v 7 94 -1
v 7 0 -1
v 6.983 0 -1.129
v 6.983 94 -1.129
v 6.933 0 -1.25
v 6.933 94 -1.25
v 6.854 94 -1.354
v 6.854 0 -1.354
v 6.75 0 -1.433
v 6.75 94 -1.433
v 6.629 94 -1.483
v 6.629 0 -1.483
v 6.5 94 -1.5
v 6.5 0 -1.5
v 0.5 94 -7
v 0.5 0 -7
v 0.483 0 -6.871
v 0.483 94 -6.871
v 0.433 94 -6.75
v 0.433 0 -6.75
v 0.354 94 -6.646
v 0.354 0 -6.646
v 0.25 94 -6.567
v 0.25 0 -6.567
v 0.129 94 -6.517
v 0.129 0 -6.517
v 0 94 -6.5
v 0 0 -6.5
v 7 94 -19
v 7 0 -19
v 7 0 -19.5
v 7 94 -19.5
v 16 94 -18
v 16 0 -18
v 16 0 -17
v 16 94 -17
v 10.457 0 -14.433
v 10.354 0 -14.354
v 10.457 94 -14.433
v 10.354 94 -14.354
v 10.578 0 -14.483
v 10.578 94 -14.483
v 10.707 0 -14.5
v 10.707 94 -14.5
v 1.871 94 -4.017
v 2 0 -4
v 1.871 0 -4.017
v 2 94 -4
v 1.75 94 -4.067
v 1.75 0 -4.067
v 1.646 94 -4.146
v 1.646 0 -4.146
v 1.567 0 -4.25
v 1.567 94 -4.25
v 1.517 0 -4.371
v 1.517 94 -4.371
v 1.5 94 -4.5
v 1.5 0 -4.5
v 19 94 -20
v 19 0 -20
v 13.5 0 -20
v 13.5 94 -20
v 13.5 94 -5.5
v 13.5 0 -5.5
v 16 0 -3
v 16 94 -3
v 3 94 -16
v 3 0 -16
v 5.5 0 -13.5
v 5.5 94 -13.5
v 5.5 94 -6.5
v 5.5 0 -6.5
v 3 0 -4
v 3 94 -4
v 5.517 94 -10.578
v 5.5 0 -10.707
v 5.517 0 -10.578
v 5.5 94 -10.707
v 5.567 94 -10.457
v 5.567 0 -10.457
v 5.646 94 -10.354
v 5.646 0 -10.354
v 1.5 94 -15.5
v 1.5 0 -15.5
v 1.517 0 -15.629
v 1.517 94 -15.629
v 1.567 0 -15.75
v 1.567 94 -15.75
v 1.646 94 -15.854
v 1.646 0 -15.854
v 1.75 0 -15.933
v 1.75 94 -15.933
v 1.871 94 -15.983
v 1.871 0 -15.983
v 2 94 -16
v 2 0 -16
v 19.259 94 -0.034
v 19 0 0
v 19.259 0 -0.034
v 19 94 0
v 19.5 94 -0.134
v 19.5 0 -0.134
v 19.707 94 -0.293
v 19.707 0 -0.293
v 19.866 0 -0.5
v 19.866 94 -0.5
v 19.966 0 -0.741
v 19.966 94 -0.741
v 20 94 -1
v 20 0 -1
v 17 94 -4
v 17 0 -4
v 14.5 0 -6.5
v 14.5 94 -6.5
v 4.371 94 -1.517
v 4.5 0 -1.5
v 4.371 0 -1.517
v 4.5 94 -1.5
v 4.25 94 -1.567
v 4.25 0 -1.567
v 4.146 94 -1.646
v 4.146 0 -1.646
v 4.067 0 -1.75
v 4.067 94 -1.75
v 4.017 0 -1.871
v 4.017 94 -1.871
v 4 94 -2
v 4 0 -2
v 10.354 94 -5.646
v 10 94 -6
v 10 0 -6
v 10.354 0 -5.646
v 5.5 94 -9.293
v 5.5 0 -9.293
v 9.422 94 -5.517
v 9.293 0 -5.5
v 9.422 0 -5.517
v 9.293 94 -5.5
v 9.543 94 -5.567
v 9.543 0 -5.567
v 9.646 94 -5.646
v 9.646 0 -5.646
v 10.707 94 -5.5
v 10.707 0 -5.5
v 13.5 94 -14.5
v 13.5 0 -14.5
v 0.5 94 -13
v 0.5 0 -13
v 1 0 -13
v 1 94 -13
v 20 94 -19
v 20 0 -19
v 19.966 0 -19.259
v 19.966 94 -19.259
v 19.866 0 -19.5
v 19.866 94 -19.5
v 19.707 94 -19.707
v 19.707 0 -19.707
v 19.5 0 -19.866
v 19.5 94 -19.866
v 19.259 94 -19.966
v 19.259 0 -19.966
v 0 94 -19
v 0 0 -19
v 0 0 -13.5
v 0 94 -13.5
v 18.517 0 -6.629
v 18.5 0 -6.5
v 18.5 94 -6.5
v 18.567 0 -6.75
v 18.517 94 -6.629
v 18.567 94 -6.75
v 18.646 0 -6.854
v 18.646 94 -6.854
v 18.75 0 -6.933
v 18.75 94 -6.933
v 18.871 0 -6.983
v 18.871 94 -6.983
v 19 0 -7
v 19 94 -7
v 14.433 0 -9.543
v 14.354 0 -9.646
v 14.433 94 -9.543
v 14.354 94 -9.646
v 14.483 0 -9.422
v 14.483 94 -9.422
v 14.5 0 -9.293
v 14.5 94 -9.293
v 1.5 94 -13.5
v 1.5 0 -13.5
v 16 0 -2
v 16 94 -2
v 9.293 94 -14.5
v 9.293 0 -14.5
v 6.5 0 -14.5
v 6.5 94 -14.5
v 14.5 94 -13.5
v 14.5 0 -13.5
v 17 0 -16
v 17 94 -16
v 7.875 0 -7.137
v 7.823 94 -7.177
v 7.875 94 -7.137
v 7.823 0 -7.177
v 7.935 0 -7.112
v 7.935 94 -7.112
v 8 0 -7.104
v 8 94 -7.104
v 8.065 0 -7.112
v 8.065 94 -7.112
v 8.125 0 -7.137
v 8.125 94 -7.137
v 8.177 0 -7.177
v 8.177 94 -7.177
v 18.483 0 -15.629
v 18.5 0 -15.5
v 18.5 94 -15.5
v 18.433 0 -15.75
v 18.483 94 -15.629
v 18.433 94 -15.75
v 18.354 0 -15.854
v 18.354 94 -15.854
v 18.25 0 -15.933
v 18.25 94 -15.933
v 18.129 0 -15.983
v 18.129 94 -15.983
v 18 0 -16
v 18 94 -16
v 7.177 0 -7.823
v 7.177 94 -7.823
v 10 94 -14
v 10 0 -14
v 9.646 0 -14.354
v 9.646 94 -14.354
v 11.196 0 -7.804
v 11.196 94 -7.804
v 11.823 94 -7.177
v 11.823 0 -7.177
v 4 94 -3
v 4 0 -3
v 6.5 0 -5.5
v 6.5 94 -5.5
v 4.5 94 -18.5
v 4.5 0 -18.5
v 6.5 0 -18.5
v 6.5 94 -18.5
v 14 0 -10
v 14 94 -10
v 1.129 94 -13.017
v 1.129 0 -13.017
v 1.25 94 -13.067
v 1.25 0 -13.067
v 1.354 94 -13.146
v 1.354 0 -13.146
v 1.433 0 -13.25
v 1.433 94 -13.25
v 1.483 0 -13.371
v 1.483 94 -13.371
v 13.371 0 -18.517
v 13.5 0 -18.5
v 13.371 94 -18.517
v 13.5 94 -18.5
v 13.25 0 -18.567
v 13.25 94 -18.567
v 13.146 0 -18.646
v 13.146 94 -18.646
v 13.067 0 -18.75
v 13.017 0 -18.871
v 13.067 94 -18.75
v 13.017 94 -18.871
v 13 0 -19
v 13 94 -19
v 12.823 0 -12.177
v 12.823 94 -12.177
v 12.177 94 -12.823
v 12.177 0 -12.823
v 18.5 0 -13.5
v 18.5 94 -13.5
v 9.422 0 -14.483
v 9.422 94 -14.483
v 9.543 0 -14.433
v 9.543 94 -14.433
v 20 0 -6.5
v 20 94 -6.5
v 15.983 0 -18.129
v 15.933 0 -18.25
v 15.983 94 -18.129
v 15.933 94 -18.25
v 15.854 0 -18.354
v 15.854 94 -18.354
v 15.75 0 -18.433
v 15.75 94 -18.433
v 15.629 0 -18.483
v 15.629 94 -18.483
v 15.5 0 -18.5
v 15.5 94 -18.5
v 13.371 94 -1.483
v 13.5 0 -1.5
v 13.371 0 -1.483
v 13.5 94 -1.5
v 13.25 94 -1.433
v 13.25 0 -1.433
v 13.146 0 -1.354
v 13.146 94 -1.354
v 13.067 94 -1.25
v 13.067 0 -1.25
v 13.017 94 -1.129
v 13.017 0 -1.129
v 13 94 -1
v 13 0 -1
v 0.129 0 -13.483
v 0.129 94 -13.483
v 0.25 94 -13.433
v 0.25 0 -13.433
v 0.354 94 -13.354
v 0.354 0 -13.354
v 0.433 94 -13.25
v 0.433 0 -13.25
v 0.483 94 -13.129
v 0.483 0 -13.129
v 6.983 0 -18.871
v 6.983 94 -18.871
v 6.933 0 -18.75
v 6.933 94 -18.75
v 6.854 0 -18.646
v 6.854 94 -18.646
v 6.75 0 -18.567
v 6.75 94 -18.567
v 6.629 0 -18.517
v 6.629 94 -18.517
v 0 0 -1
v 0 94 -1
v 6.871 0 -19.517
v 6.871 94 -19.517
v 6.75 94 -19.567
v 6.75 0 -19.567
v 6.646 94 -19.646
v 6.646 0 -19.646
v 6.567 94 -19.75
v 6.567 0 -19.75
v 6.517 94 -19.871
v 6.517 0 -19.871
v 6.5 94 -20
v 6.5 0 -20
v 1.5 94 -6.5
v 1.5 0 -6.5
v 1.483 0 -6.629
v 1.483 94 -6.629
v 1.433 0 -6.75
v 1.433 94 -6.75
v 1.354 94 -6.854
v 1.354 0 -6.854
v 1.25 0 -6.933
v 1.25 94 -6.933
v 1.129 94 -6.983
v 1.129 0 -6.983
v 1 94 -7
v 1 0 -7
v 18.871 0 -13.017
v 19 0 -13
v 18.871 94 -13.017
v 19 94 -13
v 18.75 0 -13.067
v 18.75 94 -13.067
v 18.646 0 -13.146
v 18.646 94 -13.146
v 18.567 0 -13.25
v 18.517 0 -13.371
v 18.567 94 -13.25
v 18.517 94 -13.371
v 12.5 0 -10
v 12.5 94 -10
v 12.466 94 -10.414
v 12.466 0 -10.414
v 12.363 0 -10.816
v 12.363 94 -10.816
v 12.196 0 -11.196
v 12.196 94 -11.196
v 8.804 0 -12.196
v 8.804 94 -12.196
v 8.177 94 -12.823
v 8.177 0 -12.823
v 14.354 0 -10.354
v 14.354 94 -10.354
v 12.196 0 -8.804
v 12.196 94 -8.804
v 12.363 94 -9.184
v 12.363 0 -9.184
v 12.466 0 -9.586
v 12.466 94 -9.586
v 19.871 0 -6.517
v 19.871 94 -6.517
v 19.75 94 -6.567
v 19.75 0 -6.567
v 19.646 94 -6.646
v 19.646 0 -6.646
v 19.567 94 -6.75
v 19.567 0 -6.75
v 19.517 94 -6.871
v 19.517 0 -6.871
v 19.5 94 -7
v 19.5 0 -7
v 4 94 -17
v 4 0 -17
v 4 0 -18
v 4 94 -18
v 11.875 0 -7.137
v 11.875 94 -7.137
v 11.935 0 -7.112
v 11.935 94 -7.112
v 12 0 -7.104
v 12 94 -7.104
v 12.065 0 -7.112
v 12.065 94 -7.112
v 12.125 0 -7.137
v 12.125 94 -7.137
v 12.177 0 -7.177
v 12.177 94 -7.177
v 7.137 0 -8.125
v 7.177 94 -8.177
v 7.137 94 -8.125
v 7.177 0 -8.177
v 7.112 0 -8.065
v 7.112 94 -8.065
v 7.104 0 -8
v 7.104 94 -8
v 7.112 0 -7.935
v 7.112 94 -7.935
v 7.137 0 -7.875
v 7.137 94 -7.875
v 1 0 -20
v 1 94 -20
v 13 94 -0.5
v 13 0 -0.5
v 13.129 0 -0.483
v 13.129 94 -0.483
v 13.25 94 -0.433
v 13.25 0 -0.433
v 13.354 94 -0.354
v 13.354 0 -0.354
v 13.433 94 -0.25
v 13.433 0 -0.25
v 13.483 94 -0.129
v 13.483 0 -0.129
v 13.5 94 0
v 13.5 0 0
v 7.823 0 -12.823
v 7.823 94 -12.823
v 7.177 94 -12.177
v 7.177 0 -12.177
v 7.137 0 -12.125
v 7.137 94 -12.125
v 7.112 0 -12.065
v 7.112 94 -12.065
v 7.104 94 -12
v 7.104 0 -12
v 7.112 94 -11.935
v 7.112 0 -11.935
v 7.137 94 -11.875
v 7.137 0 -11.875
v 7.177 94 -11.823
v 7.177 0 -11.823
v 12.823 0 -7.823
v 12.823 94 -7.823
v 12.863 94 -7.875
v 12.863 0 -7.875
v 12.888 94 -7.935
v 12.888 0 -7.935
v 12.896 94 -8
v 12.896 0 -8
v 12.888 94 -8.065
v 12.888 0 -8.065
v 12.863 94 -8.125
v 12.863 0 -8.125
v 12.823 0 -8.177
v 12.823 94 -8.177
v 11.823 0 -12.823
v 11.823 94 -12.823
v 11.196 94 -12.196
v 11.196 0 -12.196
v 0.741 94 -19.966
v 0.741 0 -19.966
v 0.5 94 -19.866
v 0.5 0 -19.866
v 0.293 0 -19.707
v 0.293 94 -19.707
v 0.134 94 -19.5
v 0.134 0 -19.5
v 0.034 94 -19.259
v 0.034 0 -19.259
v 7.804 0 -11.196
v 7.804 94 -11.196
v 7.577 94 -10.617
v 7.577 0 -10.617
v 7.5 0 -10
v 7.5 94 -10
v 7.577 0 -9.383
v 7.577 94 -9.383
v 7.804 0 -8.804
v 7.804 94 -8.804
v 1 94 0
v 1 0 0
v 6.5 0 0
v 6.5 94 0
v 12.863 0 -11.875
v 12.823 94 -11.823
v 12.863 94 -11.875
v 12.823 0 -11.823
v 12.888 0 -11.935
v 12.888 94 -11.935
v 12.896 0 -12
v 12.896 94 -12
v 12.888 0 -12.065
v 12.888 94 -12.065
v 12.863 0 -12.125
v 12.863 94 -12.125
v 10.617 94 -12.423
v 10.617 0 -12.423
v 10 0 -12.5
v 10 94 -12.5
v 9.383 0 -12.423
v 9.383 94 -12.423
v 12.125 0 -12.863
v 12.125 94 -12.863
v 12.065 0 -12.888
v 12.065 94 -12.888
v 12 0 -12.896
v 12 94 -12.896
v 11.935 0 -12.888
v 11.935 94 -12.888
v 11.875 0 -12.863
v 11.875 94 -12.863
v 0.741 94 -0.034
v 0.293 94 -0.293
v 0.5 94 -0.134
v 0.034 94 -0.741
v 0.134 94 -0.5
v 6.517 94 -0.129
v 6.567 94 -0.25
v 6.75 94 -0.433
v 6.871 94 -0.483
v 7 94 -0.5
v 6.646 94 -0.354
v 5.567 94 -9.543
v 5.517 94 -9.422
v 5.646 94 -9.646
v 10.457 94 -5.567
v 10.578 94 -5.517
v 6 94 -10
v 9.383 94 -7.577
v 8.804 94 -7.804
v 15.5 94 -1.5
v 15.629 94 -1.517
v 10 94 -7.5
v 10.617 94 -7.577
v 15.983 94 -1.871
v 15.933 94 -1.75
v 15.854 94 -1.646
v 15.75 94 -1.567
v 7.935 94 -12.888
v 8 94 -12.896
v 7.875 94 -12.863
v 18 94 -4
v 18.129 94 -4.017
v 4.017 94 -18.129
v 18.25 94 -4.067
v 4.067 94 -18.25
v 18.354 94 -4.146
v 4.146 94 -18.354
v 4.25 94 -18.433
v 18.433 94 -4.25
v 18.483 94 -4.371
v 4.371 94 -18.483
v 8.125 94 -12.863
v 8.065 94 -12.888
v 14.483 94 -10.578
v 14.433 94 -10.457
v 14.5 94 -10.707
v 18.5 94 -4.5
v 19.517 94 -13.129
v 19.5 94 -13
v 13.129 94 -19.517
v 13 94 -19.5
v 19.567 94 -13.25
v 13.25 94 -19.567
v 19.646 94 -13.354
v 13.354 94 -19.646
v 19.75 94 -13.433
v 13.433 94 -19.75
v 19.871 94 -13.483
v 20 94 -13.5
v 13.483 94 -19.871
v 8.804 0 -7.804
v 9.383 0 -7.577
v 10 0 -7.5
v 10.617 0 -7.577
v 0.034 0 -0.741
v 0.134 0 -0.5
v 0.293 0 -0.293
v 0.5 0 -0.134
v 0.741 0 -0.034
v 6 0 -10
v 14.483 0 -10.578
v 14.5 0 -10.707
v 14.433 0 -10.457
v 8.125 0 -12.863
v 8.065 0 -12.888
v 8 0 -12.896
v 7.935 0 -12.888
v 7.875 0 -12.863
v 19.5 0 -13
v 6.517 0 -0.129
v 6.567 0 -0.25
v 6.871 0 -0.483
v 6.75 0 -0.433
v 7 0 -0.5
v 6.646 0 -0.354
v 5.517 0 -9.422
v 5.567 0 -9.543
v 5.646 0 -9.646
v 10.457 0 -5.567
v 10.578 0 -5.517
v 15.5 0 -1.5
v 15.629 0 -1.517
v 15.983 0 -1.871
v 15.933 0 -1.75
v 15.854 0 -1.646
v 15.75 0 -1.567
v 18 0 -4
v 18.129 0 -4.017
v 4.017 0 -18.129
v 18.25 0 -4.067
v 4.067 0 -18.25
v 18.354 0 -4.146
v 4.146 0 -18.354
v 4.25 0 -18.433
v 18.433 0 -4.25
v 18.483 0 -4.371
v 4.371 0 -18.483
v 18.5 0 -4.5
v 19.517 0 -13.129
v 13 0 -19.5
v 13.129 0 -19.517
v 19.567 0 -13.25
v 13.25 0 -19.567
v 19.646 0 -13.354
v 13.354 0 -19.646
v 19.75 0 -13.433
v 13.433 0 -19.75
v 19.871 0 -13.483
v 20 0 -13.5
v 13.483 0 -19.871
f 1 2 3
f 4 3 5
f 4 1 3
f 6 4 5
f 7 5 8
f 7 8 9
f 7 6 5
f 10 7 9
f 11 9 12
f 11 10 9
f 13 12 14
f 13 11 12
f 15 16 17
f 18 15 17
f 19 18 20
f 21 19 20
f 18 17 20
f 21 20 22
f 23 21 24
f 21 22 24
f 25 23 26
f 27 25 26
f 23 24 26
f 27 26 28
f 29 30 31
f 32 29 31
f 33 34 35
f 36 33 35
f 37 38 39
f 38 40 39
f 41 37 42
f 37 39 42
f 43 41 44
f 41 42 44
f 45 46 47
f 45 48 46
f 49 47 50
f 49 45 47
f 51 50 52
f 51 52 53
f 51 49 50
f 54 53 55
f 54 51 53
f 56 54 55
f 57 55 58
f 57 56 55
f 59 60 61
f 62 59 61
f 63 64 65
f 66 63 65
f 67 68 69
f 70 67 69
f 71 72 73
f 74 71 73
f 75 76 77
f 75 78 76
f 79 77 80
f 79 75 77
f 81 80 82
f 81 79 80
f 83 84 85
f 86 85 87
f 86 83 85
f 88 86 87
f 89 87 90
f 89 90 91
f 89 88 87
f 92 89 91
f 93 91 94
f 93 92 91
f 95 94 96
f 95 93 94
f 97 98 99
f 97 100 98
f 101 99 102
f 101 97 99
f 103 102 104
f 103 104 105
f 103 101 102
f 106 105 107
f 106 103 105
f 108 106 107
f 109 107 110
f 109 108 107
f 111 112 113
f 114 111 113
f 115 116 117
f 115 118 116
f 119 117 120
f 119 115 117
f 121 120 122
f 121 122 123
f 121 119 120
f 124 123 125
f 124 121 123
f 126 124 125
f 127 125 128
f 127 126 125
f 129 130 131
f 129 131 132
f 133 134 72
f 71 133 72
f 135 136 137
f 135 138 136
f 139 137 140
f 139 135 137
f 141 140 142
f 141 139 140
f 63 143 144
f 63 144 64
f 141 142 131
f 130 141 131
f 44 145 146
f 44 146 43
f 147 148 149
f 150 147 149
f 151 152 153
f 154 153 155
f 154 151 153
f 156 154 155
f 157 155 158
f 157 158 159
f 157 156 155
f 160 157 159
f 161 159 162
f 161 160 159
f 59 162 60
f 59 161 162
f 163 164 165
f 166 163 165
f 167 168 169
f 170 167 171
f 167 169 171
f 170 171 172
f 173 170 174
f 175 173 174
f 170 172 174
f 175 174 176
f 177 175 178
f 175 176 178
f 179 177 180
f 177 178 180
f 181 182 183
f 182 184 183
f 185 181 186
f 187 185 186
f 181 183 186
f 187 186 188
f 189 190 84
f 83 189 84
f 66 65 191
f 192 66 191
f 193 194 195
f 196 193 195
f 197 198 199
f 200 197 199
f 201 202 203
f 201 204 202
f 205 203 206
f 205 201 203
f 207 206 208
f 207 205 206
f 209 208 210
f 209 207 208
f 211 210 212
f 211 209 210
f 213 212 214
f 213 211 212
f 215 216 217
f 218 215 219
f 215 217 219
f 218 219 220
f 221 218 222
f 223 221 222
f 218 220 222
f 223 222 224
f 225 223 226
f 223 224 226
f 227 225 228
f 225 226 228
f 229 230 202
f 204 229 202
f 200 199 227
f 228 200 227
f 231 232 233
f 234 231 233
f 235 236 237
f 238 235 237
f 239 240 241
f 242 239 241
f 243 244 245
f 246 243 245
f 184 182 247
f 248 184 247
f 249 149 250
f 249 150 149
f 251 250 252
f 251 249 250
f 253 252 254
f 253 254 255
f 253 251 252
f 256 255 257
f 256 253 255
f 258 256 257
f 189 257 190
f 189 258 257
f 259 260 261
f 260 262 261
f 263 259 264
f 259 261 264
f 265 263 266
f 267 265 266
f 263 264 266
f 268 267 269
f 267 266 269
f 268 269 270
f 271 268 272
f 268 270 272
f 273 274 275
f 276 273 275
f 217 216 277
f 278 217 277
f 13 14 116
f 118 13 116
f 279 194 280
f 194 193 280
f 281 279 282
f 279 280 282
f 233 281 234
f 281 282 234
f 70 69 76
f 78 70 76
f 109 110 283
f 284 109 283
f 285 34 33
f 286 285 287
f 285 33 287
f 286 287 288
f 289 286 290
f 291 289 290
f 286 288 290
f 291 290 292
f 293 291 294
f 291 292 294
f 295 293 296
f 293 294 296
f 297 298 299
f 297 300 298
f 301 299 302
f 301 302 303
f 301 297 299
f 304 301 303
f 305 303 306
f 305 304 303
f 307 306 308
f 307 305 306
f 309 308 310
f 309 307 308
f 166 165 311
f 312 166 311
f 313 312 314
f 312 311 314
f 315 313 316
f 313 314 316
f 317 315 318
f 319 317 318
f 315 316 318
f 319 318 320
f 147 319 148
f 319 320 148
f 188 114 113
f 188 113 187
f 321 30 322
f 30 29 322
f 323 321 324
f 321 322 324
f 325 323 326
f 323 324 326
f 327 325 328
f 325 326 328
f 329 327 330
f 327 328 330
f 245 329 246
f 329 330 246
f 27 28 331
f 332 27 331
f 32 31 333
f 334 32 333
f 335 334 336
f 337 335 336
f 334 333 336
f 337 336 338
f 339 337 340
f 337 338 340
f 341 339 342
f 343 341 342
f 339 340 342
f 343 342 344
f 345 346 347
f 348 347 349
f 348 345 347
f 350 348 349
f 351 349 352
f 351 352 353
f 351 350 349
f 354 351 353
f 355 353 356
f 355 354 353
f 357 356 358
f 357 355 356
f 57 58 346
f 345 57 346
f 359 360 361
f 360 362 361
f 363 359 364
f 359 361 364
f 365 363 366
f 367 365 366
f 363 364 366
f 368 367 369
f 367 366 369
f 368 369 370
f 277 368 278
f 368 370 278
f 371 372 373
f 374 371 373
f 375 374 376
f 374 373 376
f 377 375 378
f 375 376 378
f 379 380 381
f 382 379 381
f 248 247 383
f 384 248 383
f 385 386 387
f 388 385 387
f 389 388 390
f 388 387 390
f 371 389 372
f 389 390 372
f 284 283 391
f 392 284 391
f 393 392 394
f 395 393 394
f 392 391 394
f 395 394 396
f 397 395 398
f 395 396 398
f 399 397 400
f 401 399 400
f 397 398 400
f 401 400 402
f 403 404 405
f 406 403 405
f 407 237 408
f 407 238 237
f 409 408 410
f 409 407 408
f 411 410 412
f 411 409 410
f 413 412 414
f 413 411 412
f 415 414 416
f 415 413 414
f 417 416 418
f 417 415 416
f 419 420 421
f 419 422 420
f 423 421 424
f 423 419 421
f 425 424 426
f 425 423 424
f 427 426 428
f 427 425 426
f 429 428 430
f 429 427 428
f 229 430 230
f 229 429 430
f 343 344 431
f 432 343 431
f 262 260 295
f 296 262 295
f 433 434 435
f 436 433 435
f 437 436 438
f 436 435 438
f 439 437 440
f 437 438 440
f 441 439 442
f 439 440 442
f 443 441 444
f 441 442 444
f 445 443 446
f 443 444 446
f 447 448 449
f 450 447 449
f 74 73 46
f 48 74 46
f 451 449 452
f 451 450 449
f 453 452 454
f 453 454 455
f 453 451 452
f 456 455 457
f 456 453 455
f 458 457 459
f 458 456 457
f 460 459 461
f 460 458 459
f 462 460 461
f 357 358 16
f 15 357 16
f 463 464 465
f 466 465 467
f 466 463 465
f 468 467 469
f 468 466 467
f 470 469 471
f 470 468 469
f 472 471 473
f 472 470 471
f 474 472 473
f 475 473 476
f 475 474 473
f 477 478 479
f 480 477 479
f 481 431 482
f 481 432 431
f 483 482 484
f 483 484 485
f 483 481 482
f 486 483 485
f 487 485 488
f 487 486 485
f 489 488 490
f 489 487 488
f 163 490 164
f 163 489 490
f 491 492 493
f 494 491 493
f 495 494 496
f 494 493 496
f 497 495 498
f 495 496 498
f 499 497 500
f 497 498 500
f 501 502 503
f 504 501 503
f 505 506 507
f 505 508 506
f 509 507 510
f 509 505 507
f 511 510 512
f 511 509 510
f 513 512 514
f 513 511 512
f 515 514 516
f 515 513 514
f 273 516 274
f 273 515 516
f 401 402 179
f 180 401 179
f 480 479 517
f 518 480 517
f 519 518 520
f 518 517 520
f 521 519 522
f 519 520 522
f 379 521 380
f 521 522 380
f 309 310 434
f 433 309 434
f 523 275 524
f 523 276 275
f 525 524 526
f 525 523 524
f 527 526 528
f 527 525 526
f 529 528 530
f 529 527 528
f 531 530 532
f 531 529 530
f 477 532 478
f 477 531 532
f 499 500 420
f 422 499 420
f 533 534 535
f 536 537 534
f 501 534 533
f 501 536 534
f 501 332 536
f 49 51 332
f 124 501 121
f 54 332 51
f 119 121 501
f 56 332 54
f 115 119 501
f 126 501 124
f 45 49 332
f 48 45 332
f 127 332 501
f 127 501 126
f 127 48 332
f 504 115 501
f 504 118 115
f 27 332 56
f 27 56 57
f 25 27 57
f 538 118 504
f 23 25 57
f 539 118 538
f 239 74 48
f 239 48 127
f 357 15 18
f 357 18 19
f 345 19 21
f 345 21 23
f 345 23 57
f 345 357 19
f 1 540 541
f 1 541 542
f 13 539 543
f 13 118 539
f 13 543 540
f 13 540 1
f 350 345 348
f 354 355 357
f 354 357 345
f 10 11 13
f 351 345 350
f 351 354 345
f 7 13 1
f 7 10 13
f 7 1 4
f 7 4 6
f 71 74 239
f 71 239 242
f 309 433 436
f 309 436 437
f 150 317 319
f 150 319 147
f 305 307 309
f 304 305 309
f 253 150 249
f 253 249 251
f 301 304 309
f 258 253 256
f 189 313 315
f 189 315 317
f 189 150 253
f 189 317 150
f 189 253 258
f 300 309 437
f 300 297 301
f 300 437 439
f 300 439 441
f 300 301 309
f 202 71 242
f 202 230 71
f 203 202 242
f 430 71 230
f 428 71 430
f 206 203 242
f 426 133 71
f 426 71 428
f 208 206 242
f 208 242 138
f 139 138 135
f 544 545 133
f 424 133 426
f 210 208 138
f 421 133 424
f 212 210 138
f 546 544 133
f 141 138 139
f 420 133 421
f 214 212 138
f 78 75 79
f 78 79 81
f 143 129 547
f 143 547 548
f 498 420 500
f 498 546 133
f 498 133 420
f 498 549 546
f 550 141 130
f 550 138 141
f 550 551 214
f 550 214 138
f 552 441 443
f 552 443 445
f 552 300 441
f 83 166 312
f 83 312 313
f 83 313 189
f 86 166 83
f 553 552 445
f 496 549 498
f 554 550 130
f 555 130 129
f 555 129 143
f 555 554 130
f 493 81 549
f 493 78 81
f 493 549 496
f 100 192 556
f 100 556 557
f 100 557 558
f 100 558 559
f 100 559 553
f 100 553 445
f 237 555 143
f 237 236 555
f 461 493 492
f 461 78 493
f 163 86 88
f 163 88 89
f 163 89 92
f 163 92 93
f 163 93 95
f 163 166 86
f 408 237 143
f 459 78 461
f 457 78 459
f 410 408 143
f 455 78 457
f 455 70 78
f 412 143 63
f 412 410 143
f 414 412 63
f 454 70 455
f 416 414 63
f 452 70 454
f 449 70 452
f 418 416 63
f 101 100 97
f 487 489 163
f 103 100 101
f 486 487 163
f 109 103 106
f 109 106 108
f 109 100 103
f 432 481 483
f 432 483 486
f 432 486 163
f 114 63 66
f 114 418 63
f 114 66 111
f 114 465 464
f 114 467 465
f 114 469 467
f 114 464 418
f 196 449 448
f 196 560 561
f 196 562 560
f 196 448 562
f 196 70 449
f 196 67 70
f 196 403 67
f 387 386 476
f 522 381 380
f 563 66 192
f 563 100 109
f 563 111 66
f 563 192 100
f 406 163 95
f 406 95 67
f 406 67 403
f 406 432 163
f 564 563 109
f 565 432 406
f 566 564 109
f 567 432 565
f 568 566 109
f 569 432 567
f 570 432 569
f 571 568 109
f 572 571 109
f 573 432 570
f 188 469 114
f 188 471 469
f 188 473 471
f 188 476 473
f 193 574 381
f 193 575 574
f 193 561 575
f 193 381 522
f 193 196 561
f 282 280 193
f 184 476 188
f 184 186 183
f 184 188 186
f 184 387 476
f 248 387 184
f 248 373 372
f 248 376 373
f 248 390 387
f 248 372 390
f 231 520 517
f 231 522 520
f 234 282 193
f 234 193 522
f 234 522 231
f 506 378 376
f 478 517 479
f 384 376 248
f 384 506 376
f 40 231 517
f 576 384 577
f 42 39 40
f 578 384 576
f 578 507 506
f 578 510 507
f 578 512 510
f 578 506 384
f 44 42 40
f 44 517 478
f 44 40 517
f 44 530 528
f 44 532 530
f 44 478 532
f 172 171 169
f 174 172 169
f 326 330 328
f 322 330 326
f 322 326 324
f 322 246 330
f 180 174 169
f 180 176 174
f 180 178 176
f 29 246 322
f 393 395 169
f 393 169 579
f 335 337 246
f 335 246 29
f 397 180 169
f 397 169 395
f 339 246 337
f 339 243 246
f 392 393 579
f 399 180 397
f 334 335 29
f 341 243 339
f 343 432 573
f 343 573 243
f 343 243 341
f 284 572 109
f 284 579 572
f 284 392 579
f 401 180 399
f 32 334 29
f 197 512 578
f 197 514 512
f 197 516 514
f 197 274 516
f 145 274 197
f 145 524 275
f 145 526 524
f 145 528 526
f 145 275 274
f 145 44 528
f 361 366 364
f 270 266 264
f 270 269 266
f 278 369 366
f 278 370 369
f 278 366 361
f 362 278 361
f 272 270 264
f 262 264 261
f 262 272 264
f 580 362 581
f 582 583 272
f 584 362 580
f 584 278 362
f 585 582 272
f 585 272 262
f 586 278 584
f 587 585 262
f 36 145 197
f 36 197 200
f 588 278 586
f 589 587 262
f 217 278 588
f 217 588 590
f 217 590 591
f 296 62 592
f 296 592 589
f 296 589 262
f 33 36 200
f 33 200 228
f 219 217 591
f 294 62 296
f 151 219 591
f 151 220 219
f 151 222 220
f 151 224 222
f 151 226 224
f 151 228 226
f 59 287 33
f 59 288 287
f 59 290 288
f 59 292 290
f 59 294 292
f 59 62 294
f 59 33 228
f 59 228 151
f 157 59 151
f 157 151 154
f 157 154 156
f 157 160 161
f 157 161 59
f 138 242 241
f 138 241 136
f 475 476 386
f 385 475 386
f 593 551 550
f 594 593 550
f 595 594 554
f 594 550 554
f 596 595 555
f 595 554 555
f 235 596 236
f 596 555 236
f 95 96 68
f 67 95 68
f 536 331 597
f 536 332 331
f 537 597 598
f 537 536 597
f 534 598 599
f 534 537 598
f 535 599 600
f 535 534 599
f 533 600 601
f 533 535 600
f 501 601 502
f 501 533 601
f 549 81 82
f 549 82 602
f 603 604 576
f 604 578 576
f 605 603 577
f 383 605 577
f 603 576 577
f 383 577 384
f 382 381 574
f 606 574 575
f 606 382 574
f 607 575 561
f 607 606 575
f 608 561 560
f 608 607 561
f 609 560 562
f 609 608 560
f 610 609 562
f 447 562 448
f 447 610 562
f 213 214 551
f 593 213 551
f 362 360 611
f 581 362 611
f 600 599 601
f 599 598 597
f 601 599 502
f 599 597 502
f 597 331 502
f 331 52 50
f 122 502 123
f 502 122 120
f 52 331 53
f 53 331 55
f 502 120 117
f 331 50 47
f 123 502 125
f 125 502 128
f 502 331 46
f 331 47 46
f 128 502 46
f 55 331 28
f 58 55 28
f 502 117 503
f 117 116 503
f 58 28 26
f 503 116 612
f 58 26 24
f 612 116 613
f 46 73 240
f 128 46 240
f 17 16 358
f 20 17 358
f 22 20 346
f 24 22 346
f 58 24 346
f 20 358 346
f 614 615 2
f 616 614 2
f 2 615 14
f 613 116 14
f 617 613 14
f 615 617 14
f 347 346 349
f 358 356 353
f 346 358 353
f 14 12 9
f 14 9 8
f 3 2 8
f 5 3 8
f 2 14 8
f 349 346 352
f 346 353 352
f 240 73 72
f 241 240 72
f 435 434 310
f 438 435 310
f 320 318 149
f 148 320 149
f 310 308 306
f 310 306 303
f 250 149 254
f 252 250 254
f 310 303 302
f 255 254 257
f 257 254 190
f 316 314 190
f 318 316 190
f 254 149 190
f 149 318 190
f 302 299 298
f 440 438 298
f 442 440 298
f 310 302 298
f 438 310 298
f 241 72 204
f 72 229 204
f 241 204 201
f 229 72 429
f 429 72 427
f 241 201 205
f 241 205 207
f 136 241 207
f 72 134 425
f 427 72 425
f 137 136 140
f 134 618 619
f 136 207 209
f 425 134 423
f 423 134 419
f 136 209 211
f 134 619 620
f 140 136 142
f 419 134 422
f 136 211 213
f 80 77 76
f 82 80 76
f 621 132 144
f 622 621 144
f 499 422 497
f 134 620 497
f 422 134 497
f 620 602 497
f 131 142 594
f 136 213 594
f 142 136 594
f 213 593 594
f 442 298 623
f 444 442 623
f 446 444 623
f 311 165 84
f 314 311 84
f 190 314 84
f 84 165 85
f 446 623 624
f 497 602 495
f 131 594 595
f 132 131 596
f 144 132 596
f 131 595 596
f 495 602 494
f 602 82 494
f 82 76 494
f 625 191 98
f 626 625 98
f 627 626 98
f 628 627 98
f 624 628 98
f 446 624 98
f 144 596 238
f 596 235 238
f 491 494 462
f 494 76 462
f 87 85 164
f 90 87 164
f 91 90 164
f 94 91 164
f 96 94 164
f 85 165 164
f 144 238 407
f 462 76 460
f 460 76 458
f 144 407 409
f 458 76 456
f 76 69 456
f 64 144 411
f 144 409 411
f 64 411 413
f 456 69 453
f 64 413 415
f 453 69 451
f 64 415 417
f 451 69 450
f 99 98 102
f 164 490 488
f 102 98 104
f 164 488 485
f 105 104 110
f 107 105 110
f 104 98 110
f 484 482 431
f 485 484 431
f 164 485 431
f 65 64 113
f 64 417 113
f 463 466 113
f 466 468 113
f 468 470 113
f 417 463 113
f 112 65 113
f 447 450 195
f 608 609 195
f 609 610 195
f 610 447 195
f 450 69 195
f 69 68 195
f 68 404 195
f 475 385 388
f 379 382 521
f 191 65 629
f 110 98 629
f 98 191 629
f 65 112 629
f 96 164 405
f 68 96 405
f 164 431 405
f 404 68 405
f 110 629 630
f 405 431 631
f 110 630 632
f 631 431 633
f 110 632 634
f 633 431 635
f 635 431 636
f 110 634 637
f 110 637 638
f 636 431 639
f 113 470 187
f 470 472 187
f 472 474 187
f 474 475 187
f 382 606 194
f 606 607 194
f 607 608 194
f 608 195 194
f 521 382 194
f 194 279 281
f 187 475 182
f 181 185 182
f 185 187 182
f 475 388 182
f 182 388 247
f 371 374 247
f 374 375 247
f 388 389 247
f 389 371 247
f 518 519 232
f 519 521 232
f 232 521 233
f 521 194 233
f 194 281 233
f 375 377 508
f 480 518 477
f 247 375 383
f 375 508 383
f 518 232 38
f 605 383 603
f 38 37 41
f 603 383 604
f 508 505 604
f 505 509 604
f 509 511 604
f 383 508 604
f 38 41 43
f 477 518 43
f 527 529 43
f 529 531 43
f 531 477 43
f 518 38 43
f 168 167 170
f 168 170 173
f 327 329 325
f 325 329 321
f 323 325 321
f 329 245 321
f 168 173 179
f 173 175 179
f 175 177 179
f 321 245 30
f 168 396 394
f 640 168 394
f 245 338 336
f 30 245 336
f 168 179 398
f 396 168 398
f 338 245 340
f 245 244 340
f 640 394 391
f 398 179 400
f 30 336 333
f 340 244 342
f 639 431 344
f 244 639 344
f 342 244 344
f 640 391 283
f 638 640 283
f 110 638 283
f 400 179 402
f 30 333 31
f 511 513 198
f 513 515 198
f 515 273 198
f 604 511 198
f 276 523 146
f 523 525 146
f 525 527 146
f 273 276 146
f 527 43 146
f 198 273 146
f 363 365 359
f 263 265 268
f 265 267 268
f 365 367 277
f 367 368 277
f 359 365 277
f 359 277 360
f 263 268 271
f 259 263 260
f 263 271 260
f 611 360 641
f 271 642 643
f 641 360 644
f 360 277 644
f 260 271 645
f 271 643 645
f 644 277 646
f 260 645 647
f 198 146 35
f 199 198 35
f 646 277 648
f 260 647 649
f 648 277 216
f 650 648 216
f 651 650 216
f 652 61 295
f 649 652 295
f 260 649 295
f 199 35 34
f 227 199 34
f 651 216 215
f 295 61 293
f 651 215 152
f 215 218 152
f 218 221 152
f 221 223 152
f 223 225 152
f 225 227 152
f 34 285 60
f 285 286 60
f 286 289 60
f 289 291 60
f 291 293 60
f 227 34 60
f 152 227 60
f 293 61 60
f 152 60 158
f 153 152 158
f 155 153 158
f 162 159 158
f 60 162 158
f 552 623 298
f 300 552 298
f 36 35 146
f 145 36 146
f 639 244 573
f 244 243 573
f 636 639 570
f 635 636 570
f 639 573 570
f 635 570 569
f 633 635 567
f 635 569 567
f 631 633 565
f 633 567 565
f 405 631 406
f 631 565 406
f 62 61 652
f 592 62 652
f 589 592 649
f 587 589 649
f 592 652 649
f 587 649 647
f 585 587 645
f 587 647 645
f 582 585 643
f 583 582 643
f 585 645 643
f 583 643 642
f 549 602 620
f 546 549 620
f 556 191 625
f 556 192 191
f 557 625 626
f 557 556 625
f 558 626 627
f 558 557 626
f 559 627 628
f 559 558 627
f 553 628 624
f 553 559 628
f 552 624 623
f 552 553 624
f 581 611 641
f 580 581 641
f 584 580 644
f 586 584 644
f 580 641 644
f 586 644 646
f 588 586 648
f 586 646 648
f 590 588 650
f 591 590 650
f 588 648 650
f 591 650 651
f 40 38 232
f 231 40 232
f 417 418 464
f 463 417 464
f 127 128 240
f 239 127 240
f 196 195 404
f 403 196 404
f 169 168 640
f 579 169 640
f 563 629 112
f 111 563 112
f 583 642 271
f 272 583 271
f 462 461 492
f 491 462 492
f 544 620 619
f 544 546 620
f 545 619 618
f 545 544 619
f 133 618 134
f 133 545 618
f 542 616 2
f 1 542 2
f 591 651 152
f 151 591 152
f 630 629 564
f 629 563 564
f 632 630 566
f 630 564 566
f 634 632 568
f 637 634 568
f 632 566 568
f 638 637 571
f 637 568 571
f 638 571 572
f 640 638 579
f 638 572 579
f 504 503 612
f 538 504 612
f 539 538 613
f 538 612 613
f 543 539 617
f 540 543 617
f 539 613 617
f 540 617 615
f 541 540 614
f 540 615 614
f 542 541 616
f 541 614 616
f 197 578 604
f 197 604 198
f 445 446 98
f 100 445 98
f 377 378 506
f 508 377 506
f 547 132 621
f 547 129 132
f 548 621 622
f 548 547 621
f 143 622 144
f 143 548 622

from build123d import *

# Parameters (mm, degrees)
BOSS_EXTRUDE1_DEPTH = 94
FILLET1_R           = 1
CUT_EXTRUDE1_DEPTH  = 95
FILLET2_R           = 0.5
FILLET3_R           = 0.25


with BuildPart() as part:
    # Sketch3 → Boss-Extrude1 (new body)
    with BuildSketch(Plane(origin=(0, 0, 0), x_dir=(1, 0, 0), z_dir=(0, 1, 0))):
        with BuildLine():
            Line((7, 18.5), (7, 19.5))
            ThreePointArc((7, 19.5), (6.646446609, 19.646446609), (6.5, 20))
            Line((6.5, 20), (0, 20))
            Line((0, 20), (0, 13.5))
            ThreePointArc((0, 13.5), (0.353553391, 13.353553391), (0.5, 13))
            Line((0.5, 13), (1.5, 13))
            Line((1.5, 13), (1.5, 16))
            Line((1.5, 16), (3, 16))
            Line((3, 16), (5.5, 13.5))
            Line((5.5, 13.5), (5.5, 10.5))
            Line((5.5, 10.5), (6, 10))
            Line((6, 10), (5.5, 9.5))
            Line((5.5, 9.5), (5.5, 6.5))
            Line((5.5, 6.5), (3, 4))
            Line((3, 4), (1.5, 4))
            Line((1.5, 4), (1.5, 7))
            Line((1.5, 7), (0.5, 7))
            ThreePointArc((0.5, 7), (0.353553391, 6.646446609), (0, 6.5))
            Line((0, 6.5), (0, 0))
            Line((0, 0), (6.5, 0))
            ThreePointArc((6.5, 0), (6.646446609, 0.353553391), (7, 0.5))
            Line((7, 0.5), (7, 1.5))
            Line((7, 1.5), (4, 1.5))
            Line((4, 1.5), (4, 3))
            Line((4, 3), (6.5, 5.5))
            Line((6.5, 5.5), (9.5, 5.5))
            Line((9.5, 5.5), (10, 6))
            Line((10, 6), (10.5, 5.5))
            Line((10.5, 5.5), (13.5, 5.5))
            Line((13.5, 5.5), (16, 3))
            Line((16, 3), (16, 1.5))
            Line((16, 1.5), (13, 1.5))
            Line((13, 1.5), (13, 0.5))
            ThreePointArc((13, 0.5), (13.353553391, 0.353553391), (13.5, 0))
            Line((13.5, 0), (20, 0))
            Line((20, 0), (20, 6.5))
            ThreePointArc((20, 6.5), (19.646446609, 6.646446609), (19.5, 7))
            Line((19.5, 7), (18.5, 7))
            Line((18.5, 7), (18.5, 4))
            Line((18.5, 4), (17, 4))
            Line((17, 4), (14.5, 6.5))
            Line((14.5, 6.5), (14.5, 9.5))
            Line((14.5, 9.5), (14, 10))
            Line((14, 10), (14.5, 10.5))
            Line((14.5, 10.5), (14.5, 13.5))
            Line((14.5, 13.5), (17, 16))
            Line((17, 16), (18.5, 16))
            Line((18.5, 16), (18.5, 13))
            Line((18.5, 13), (19.5, 13))
            ThreePointArc((19.5, 13), (19.646446609, 13.353553391), (20, 13.5))
            Line((20, 13.5), (20, 20))
            Line((20, 20), (13.5, 20))
            ThreePointArc((13.5, 20), (13.353553391, 19.646446609), (13, 19.5))
            Line((13, 19.5), (13, 18.5))
            Line((13, 18.5), (16, 18.5))
            Line((16, 18.5), (16, 17))
            Line((16, 17), (13.5, 14.5))
            Line((13.5, 14.5), (10.5, 14.5))
            Line((10.5, 14.5), (10, 14))
            Line((10, 14), (9.5, 14.5))
            Line((9.5, 14.5), (6.5, 14.5))
            Line((6.5, 14.5), (4, 17))
            Line((4, 17), (4, 18.5))
            Line((4, 18.5), (7, 18.5))
        make_face()
    extrude(amount=BOSS_EXTRUDE1_DEPTH)

    # Fillet1
    fillet1_edges = [part.edges().sort_by_distance(p)[0] for p in [
        (20, 47, 0),
        (0, 47, 0),
        (0, 47, -20),
        (20, 47, -20),
    ]]
    fillet(fillet1_edges, radius=FILLET1_R)

    # Sketch4 → Cut-Extrude1 (cut, through all)
    with BuildSketch(Plane(origin=(0, 94, 0), x_dir=(1, 0, 0), z_dir=(0, 1, 0))):
        with BuildLine():
            Line((10, 11), (11.195582496, 12.195582496))
            ThreePointArc((11.195582496, 12.195582496), (10, 12.5), (8.804417504, 12.195582496))
            Line((8.804417504, 12.195582496), (10, 11))
        make_face()
        with BuildLine():
            ThreePointArc((12.195582496, 11.195582496), (11.767766953, 11.767766953), (11.195582496, 12.195582496))
            Line((11.195582496, 12.195582496), (10, 11))
            Line((10, 11), (11, 10))
            Line((11, 10), (12.195582496, 11.195582496))
        make_face()
        with BuildLine():
            Line((9, 10), (10, 11))
            Line((10, 11), (8.804417504, 12.195582496))
            ThreePointArc((8.804417504, 12.195582496), (8.232233047, 11.767766953), (7.804417504, 11.195582496))
            Line((7.804417504, 11.195582496), (9, 10))
        make_face()
        Polygon((11, 10), (10, 11), (9, 10), (10, 9), align=None)
        with BuildLine():
            Line((7.804417504, 8.804417504), (9, 10))
            Line((9, 10), (7.804417504, 11.195582496))
            ThreePointArc((7.804417504, 11.195582496), (7.5, 10), (7.804417504, 8.804417504))
        make_face()
        with BuildLine():
            Line((10, 9), (9, 10))
            Line((9, 10), (7.804417504, 8.804417504))
            ThreePointArc((7.804417504, 8.804417504), (8.232233047, 8.232233047), (8.804417504, 7.804417504))
            Line((8.804417504, 7.804417504), (10, 9))
        make_face()
        with BuildLine():
            Line((11.195582496, 7.804417504), (10, 9))
            Line((10, 9), (8.804417504, 7.804417504))
            ThreePointArc((8.804417504, 7.804417504), (10, 7.5), (11.195582496, 7.804417504))
        make_face()
        with BuildLine():
            Line((12.195582496, 8.804417504), (11, 10))
            Line((11, 10), (10, 9))
            Line((10, 9), (11.195582496, 7.804417504))
            ThreePointArc((11.195582496, 7.804417504), (11.767766953, 8.232233047), (12.195582496, 8.804417504))
        make_face()
        with BuildLine():
            ThreePointArc((12.5, 10), (12.422700584, 10.616864556), (12.195582496, 11.195582496))
            Line((12.195582496, 11.195582496), (11, 10))
            Line((11, 10), (12.195582496, 8.804417504))
            ThreePointArc((12.195582496, 8.804417504), (12.422700584, 9.383135444), (12.5, 10))
        make_face()
        with BuildLine():
            ThreePointArc((8.804417504, 7.804417504), (8.232233047, 8.232233047), (7.804417504, 8.804417504))
            Line((7.804417504, 8.804417504), (7, 8))
            Line((7, 8), (8, 7))
            Line((8, 7), (8.804417504, 7.804417504))
        make_face()
        with BuildLine():
            Line((13, 8), (12.195582496, 8.804417504))
            ThreePointArc((12.195582496, 8.804417504), (11.767766953, 8.232233047), (11.195582496, 7.804417504))
            Line((11.195582496, 7.804417504), (12, 7))
            Line((12, 7), (13, 8))
        make_face()
        with BuildLine():
            Line((13, 12), (12, 13))
            Line((12, 13), (11.195582496, 12.195582496))
            ThreePointArc((11.195582496, 12.195582496), (11.767766953, 11.767766953), (12.195582496, 11.195582496))
            Line((12.195582496, 11.195582496), (13, 12))
        make_face()
        with BuildLine():
            ThreePointArc((7.804417504, 11.195582496), (8.232233047, 11.767766953), (8.804417504, 12.195582496))
            Line((8.804417504, 12.195582496), (8, 13))
            Line((8, 13), (7, 12))
            Line((7, 12), (7.804417504, 11.195582496))
        make_face()
    extrude(amount=-CUT_EXTRUDE1_DEPTH, mode=Mode.SUBTRACT)

    # Fillet2
    fillet2_edges = [part.edges().sort_by_distance(p)[0] for p in [
        (18.5, 47, -13),
        (18.5, 47, -16),
        (14.5, 47, -10.5),
        (14.5, 47, -9.5),
        (18.5, 47, -4),
        (18.5, 47, -7),
        (13, 47, -1.5),
        (16, 47, -1.5),
        (10.5, 47, -5.5),
        (9.5, 47, -5.5),
        (4, 47, -1.5),
        (7, 47, -1.5),
        (1.5, 47, -7),
        (1.5, 47, -4),
        (5.5, 47, -9.5),
        (5.5, 47, -10.5),
        (1.5, 47, -16),
        (1.5, 47, -13),
        (7, 47, -18.5),
        (4, 47, -18.5),
        (9.5, 47, -14.5),
        (10.5, 47, -14.5),
        (16, 47, -18.5),
        (13, 47, -18.5),
    ]]
    fillet(fillet2_edges, radius=FILLET2_R)

    # Fillet3
    fillet3_edges = [part.edges().sort_by_distance(p)[0] for p in [
        (7, 47, -12),
        (8, 47, -13),
        (12, 47, -13),
        (13, 47, -12),
        (13, 47, -8),
        (12, 47, -7),
        (8, 47, -7),
        (7, 47, -8),
    ]]
    fillet(fillet3_edges, radius=FILLET3_R)


solid = part.part
